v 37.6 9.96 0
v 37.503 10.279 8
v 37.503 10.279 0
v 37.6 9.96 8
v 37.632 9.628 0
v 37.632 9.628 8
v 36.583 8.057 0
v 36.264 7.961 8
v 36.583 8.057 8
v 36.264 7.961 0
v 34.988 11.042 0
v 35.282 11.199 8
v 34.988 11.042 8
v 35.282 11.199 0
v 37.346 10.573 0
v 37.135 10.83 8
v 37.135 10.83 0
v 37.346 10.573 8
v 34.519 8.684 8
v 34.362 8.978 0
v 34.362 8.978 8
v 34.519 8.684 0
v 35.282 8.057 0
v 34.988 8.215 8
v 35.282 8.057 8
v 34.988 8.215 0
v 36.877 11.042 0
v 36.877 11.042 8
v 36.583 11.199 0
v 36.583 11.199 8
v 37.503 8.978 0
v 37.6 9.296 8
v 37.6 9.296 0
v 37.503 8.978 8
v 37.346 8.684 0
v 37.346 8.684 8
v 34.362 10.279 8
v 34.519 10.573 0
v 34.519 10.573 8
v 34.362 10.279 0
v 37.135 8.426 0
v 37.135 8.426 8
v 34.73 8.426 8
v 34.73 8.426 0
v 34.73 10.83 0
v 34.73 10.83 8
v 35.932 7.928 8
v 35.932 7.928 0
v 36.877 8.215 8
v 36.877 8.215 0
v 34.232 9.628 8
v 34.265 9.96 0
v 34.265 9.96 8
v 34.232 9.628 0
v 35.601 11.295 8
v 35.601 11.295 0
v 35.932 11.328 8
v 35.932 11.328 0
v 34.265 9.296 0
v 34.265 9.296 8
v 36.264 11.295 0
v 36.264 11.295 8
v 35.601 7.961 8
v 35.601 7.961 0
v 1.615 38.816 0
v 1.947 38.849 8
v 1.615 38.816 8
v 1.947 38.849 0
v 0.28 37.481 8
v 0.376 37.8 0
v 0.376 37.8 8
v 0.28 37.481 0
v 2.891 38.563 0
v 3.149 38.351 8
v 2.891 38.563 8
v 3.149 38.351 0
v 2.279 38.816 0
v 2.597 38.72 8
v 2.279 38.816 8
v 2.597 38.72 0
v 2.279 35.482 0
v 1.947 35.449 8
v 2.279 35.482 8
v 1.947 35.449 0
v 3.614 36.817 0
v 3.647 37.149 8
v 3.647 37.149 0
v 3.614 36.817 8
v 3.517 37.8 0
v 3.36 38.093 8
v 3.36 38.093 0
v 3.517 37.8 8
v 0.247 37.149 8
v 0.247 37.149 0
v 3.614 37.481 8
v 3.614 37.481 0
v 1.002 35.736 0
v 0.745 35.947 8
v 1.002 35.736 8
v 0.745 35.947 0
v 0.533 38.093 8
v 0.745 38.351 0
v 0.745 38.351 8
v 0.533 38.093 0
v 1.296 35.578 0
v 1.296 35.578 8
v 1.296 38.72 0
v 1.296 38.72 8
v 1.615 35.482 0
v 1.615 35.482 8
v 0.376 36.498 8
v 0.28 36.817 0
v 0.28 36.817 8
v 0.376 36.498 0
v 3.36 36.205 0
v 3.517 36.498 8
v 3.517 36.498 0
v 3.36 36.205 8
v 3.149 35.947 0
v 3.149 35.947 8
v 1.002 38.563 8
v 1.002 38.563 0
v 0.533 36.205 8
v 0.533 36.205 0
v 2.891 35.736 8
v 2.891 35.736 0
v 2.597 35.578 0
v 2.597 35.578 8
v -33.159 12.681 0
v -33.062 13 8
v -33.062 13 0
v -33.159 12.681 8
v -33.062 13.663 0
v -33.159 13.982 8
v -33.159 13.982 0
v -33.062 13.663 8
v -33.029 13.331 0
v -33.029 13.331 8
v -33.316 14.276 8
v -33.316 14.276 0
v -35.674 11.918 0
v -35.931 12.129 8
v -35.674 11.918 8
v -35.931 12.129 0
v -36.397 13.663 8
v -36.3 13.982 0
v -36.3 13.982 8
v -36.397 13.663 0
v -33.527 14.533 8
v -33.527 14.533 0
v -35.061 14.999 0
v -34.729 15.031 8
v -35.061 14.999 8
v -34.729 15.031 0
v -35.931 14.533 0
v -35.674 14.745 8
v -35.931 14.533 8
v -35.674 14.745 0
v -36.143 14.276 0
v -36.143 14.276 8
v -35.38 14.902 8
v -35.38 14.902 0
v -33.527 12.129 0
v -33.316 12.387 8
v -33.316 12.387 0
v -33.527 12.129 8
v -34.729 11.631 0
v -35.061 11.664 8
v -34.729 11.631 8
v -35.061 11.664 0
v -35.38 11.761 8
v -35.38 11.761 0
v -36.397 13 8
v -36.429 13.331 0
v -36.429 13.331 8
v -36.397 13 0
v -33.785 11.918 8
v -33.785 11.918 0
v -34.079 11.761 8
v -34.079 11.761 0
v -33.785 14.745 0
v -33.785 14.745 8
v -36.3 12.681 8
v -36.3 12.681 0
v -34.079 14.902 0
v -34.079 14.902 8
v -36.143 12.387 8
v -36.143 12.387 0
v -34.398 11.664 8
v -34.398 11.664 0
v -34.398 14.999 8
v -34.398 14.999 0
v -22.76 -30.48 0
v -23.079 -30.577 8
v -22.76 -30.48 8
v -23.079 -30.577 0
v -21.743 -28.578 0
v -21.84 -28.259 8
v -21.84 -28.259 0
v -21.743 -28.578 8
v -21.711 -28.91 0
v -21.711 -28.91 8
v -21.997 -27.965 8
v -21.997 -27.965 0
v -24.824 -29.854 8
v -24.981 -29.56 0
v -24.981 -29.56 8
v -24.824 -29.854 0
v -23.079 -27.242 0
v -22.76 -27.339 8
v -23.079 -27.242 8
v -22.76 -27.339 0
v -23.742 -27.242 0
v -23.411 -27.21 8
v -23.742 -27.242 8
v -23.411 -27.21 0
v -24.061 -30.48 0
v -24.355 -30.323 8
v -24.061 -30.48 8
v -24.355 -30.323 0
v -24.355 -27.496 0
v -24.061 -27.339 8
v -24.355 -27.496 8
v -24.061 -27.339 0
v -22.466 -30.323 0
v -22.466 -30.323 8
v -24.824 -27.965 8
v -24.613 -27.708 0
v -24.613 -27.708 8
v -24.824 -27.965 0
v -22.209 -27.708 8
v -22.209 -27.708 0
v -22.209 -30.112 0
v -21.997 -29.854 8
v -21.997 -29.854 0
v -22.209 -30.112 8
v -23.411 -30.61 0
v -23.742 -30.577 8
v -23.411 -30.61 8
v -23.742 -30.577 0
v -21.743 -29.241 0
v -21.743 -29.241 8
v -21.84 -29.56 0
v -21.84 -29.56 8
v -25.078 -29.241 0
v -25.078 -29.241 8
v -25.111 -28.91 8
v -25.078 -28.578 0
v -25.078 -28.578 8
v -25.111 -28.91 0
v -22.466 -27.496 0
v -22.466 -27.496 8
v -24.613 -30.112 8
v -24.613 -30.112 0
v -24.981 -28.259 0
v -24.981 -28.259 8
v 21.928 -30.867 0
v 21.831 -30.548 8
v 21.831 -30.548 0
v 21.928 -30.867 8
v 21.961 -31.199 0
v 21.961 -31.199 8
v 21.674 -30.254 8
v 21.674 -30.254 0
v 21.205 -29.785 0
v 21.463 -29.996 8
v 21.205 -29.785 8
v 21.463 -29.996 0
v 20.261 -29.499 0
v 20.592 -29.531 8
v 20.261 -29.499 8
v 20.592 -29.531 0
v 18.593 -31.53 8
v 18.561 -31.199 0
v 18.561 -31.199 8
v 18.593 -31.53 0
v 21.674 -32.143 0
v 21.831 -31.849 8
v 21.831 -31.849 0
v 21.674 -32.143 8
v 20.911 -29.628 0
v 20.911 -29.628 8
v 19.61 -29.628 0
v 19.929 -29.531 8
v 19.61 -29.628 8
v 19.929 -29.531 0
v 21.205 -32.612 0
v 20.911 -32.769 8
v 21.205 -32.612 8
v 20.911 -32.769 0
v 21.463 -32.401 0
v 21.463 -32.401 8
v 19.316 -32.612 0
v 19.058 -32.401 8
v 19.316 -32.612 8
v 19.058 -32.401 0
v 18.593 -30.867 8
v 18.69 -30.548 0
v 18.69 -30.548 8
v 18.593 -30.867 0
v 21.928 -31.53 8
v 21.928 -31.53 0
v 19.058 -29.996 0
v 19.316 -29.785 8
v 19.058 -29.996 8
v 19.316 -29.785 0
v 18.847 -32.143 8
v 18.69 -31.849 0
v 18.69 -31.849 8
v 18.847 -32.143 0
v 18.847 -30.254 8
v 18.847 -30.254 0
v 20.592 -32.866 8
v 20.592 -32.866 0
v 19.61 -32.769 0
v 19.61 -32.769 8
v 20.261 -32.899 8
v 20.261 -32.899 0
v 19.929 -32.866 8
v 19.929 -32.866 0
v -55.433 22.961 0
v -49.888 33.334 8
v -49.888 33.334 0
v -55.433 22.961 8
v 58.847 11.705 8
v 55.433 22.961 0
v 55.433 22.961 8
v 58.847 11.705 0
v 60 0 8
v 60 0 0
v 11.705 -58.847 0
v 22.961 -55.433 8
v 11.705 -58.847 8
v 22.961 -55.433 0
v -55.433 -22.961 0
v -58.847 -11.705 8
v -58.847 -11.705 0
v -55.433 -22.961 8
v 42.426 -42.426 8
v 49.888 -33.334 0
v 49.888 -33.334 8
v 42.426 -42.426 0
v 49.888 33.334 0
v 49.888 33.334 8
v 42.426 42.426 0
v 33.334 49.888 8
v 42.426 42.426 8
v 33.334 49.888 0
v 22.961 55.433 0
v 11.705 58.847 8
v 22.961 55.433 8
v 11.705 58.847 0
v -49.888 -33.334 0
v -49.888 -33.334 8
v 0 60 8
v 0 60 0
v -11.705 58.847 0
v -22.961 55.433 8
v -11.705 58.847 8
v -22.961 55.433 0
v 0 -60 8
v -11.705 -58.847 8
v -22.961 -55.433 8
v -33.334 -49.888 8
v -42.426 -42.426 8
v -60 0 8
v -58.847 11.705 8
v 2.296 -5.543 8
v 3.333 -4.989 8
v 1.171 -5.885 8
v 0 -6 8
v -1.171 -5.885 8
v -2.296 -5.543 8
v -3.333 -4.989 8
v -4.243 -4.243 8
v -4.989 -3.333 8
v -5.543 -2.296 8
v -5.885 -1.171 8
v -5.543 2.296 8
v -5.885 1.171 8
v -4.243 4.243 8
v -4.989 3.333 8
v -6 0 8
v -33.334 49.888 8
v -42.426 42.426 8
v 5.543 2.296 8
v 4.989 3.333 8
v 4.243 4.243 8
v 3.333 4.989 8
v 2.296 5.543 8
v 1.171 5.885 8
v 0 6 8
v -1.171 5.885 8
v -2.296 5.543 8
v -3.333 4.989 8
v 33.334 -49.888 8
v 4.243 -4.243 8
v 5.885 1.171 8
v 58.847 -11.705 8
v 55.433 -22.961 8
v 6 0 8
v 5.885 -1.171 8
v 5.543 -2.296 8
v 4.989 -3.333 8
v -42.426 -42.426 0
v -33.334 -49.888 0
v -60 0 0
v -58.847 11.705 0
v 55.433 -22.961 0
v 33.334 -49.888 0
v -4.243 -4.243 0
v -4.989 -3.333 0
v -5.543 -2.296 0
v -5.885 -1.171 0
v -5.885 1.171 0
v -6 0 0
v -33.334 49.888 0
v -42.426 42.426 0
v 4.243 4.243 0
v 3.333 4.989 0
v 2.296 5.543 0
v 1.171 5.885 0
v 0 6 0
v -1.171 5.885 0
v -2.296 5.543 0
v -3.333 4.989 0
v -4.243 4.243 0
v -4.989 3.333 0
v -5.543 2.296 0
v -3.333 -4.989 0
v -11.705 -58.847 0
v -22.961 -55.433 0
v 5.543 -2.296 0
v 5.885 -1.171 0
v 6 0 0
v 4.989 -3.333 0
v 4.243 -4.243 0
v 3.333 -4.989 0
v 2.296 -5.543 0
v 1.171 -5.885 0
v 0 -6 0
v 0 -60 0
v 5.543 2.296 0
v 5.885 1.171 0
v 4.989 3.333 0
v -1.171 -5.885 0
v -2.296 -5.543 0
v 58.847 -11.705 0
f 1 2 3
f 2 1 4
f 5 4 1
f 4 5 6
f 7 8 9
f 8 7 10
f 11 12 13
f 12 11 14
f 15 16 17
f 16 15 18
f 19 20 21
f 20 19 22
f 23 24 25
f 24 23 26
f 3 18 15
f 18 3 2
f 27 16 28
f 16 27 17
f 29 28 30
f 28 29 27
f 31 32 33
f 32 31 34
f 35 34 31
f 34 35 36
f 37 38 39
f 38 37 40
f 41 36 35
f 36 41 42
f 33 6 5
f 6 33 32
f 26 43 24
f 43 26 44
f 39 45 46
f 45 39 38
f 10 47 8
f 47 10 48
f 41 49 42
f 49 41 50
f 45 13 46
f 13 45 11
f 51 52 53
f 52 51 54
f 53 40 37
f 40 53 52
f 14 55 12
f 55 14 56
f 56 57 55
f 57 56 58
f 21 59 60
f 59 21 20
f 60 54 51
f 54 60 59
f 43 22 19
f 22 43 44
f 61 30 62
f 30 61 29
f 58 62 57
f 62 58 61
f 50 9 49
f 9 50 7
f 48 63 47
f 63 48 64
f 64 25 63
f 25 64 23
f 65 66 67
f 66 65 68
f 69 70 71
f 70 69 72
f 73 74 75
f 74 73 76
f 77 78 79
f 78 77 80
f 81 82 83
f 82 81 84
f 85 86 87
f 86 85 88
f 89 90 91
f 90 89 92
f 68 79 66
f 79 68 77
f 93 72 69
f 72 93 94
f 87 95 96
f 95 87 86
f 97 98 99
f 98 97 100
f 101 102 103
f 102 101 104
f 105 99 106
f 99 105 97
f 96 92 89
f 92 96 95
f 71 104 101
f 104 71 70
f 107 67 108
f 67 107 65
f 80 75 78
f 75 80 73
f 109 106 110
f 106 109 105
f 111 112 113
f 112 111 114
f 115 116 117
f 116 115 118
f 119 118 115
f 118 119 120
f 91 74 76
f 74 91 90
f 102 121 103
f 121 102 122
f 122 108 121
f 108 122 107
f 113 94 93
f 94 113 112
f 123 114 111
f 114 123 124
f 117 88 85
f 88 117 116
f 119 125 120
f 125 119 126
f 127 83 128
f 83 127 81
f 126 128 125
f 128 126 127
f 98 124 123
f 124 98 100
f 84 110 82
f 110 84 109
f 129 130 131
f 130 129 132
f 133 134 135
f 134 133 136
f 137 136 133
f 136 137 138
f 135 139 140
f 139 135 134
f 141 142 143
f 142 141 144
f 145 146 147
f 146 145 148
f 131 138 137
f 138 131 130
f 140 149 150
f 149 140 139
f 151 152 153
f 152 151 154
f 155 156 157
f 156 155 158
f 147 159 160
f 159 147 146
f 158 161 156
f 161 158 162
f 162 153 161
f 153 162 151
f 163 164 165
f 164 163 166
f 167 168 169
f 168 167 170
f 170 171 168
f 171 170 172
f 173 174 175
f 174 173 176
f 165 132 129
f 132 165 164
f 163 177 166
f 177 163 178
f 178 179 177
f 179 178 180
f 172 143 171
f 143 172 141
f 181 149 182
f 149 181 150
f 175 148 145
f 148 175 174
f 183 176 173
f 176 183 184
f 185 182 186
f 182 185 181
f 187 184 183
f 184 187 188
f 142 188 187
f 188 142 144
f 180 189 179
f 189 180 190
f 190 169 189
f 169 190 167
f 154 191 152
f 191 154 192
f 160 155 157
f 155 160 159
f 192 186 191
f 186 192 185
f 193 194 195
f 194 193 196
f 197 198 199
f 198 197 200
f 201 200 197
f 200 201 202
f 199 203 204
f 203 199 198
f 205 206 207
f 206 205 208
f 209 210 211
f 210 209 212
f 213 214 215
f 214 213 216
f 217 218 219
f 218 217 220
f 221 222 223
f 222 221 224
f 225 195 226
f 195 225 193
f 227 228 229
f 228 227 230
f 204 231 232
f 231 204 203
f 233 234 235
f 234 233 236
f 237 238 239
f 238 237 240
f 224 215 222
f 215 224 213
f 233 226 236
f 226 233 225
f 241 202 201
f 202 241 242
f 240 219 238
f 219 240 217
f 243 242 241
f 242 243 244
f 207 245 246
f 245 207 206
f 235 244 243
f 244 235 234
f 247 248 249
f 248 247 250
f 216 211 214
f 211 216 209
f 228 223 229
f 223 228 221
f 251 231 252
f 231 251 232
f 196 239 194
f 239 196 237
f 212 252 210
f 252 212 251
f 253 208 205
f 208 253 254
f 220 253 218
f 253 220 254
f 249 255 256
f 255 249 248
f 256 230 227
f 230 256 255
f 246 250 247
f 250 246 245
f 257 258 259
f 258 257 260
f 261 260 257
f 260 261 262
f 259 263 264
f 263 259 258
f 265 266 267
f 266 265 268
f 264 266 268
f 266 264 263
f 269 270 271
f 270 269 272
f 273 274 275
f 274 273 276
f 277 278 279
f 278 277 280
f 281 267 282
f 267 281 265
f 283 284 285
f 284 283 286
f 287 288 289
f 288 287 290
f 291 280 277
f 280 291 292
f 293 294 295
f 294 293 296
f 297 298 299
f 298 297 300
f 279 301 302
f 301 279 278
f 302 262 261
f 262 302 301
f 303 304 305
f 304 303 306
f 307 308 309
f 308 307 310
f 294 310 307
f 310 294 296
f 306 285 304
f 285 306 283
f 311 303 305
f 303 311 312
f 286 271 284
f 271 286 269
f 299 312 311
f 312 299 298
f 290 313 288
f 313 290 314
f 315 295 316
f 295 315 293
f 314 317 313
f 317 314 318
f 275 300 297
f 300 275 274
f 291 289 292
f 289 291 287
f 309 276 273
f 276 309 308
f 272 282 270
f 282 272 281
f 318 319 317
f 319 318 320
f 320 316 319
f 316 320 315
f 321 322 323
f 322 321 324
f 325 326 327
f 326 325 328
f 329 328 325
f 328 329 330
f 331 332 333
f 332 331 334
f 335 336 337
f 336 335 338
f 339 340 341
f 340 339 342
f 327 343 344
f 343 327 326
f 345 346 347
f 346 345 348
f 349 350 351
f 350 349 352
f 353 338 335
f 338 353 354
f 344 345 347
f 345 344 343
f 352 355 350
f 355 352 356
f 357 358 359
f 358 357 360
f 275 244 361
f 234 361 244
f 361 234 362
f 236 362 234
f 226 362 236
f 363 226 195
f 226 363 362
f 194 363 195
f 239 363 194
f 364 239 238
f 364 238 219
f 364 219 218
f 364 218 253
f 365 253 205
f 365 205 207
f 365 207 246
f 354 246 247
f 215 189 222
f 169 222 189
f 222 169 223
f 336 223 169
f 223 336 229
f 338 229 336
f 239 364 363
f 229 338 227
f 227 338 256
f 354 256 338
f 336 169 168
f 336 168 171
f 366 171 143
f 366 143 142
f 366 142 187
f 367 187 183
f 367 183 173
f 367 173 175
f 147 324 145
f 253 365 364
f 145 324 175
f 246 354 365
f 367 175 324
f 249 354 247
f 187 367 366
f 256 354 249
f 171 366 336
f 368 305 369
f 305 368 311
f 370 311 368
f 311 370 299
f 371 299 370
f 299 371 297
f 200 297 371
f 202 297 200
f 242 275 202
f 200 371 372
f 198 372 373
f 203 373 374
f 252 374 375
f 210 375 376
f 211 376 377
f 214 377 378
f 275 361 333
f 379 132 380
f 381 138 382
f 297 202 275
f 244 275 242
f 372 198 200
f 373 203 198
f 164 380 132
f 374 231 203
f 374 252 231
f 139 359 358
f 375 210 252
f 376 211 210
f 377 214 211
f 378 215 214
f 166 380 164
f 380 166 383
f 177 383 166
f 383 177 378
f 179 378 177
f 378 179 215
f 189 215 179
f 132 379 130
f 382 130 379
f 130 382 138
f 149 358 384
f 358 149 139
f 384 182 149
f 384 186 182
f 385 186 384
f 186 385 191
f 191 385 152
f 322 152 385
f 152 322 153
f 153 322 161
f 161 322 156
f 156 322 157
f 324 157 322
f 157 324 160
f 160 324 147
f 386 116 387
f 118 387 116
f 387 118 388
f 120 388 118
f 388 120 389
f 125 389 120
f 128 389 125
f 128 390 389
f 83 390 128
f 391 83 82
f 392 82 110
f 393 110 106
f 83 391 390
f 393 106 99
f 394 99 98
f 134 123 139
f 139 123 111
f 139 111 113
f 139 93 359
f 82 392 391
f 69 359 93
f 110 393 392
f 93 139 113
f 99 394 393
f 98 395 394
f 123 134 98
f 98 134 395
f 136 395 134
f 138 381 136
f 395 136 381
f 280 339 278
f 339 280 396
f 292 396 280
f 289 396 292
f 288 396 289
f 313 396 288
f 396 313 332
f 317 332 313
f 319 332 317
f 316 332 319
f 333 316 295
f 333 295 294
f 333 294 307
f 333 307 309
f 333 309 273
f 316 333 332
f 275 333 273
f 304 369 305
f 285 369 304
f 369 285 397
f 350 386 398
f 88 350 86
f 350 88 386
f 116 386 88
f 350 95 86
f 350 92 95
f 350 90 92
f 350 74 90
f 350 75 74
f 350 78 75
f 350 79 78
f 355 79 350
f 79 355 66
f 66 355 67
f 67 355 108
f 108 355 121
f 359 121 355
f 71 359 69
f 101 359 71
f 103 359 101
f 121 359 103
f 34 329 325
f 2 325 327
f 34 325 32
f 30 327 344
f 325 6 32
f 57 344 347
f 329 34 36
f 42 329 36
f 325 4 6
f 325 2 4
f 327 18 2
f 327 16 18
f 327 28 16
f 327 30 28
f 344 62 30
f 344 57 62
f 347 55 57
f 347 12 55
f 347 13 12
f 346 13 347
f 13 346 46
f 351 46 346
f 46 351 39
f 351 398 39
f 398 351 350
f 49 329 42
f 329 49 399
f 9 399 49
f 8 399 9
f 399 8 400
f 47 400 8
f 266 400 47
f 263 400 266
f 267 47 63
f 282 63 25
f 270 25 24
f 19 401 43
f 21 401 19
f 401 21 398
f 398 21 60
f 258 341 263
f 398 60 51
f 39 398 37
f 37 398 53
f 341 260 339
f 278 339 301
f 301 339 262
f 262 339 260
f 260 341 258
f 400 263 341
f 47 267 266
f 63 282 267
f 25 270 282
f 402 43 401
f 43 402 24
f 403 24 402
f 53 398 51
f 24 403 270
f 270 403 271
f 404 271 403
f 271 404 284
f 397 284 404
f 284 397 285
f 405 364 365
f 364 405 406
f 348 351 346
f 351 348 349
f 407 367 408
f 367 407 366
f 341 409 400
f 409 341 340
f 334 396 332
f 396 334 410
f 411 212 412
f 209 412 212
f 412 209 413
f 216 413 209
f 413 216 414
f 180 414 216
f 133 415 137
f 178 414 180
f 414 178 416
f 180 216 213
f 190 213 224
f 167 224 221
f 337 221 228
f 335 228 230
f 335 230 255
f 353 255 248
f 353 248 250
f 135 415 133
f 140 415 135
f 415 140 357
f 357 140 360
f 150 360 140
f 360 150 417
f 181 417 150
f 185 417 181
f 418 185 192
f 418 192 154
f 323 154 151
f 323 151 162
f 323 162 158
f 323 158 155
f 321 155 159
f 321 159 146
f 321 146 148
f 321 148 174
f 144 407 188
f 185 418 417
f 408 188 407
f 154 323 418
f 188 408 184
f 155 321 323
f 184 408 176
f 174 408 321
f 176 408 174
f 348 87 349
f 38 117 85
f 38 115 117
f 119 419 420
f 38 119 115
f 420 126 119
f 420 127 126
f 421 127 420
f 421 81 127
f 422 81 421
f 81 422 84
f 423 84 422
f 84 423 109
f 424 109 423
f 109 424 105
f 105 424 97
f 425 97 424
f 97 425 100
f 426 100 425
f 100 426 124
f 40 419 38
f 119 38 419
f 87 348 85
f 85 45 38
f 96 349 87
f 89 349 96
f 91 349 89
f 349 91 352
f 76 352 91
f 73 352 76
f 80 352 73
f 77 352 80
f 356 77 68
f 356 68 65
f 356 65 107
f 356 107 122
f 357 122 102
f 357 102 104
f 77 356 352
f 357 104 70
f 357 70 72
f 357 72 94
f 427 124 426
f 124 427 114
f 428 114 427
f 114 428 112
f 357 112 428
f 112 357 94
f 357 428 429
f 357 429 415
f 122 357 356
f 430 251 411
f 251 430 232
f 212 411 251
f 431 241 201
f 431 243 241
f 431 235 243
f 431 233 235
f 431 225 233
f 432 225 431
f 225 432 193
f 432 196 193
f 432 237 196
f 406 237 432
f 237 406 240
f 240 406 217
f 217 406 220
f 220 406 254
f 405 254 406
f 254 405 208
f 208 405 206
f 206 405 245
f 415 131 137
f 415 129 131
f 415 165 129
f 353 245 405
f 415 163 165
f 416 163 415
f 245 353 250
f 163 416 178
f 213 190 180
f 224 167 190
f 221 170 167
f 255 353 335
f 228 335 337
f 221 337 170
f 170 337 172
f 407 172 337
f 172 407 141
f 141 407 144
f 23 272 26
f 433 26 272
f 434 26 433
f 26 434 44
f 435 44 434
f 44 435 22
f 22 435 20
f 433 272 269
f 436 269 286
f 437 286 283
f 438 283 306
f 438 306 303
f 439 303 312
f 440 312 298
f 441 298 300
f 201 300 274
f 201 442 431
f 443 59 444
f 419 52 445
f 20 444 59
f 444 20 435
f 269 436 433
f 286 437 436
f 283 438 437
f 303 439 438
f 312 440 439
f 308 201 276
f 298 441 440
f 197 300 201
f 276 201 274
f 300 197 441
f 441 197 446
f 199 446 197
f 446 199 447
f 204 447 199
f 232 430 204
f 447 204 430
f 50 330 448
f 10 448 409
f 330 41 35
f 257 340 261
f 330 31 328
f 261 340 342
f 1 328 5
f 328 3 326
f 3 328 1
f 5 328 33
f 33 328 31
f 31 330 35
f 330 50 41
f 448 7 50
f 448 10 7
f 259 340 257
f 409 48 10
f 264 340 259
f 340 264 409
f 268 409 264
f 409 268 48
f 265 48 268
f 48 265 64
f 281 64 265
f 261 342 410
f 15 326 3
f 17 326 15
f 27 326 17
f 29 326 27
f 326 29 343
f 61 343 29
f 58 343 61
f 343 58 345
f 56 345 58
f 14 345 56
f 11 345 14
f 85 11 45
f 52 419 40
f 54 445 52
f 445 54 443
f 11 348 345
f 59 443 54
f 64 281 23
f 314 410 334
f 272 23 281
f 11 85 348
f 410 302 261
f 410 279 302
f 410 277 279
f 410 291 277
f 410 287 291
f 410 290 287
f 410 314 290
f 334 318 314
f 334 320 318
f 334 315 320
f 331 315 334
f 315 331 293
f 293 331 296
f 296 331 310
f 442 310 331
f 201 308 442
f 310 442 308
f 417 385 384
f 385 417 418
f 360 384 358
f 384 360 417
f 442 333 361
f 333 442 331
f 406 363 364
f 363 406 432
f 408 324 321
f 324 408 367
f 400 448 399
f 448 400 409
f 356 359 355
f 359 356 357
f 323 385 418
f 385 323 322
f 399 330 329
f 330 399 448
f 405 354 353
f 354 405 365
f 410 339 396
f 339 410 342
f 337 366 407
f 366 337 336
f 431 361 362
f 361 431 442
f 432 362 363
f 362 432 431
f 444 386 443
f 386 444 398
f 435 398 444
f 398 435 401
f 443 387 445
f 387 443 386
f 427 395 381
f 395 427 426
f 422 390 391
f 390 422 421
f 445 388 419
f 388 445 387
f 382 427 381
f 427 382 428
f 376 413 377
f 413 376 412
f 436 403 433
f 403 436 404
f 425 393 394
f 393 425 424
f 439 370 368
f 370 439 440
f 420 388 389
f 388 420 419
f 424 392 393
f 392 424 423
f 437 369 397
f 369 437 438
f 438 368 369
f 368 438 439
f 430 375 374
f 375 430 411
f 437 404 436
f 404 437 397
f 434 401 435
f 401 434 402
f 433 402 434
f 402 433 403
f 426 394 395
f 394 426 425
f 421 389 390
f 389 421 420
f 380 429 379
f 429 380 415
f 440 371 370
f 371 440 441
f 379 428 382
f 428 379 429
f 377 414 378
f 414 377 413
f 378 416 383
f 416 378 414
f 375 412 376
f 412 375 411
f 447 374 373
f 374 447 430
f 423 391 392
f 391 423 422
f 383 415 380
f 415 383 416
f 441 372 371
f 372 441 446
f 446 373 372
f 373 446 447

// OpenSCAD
$fn = 32;

// ----------------------------------------------------------------------
// Flange Ø120 x 8
// 5 holes on a Ø74.4 bolt circle, bolted joints
// ----------------------------------------------------------------------

// --- parameters (mm) ---
flange_d = 120;  // outside diameter of the flange
thickness = 8;   // flange thickness
holes = 5;       // number of bolt holes
pcd = 74.4;      // bolt circle diameter
start_deg = 15;  // angle of the first hole, from +X
hole_d = 3.4;    // bolt hole diameter
bore_d = 12;     // central through bore
hub_d = 22;      // hub outside diameter
hub_h = 0;       // hub height above the flange face (0 = no hub)

// --- derived feature positions (mm) ---
height = thickness + hub_h;  // = 8   overall height of the part
pcd_r = pcd / 2;             // = 37.2   bolt circle radius
hole_step = 360 / holes;     // = 72   angular pitch
feature_centers = [
  [pcd_r * cos(start_deg + 0 * hole_step), pcd_r * sin(start_deg + 0 * hole_step)],
  [pcd_r * cos(start_deg + 1 * hole_step), pcd_r * sin(start_deg + 1 * hole_step)],
  [pcd_r * cos(start_deg + 2 * hole_step), pcd_r * sin(start_deg + 2 * hole_step)],
  [pcd_r * cos(start_deg + 3 * hole_step), pcd_r * sin(start_deg + 3 * hole_step)],
  [pcd_r * cos(start_deg + 4 * hole_step), pcd_r * sin(start_deg + 4 * hole_step)]
];   // bolt hole centres on the pitch circle

// flange disc, every hole and the bore cut straight through
difference() {
  union() {
    cylinder(d = flange_d, h = thickness);
  }
  translate([0, 0, -1]) cylinder(d = bore_d, h = height + 2);  // bore, through
  for (centre = feature_centers)
    translate([centre[0], centre[1], -1]) cylinder(d = hole_d, h = thickness + 2);
}
